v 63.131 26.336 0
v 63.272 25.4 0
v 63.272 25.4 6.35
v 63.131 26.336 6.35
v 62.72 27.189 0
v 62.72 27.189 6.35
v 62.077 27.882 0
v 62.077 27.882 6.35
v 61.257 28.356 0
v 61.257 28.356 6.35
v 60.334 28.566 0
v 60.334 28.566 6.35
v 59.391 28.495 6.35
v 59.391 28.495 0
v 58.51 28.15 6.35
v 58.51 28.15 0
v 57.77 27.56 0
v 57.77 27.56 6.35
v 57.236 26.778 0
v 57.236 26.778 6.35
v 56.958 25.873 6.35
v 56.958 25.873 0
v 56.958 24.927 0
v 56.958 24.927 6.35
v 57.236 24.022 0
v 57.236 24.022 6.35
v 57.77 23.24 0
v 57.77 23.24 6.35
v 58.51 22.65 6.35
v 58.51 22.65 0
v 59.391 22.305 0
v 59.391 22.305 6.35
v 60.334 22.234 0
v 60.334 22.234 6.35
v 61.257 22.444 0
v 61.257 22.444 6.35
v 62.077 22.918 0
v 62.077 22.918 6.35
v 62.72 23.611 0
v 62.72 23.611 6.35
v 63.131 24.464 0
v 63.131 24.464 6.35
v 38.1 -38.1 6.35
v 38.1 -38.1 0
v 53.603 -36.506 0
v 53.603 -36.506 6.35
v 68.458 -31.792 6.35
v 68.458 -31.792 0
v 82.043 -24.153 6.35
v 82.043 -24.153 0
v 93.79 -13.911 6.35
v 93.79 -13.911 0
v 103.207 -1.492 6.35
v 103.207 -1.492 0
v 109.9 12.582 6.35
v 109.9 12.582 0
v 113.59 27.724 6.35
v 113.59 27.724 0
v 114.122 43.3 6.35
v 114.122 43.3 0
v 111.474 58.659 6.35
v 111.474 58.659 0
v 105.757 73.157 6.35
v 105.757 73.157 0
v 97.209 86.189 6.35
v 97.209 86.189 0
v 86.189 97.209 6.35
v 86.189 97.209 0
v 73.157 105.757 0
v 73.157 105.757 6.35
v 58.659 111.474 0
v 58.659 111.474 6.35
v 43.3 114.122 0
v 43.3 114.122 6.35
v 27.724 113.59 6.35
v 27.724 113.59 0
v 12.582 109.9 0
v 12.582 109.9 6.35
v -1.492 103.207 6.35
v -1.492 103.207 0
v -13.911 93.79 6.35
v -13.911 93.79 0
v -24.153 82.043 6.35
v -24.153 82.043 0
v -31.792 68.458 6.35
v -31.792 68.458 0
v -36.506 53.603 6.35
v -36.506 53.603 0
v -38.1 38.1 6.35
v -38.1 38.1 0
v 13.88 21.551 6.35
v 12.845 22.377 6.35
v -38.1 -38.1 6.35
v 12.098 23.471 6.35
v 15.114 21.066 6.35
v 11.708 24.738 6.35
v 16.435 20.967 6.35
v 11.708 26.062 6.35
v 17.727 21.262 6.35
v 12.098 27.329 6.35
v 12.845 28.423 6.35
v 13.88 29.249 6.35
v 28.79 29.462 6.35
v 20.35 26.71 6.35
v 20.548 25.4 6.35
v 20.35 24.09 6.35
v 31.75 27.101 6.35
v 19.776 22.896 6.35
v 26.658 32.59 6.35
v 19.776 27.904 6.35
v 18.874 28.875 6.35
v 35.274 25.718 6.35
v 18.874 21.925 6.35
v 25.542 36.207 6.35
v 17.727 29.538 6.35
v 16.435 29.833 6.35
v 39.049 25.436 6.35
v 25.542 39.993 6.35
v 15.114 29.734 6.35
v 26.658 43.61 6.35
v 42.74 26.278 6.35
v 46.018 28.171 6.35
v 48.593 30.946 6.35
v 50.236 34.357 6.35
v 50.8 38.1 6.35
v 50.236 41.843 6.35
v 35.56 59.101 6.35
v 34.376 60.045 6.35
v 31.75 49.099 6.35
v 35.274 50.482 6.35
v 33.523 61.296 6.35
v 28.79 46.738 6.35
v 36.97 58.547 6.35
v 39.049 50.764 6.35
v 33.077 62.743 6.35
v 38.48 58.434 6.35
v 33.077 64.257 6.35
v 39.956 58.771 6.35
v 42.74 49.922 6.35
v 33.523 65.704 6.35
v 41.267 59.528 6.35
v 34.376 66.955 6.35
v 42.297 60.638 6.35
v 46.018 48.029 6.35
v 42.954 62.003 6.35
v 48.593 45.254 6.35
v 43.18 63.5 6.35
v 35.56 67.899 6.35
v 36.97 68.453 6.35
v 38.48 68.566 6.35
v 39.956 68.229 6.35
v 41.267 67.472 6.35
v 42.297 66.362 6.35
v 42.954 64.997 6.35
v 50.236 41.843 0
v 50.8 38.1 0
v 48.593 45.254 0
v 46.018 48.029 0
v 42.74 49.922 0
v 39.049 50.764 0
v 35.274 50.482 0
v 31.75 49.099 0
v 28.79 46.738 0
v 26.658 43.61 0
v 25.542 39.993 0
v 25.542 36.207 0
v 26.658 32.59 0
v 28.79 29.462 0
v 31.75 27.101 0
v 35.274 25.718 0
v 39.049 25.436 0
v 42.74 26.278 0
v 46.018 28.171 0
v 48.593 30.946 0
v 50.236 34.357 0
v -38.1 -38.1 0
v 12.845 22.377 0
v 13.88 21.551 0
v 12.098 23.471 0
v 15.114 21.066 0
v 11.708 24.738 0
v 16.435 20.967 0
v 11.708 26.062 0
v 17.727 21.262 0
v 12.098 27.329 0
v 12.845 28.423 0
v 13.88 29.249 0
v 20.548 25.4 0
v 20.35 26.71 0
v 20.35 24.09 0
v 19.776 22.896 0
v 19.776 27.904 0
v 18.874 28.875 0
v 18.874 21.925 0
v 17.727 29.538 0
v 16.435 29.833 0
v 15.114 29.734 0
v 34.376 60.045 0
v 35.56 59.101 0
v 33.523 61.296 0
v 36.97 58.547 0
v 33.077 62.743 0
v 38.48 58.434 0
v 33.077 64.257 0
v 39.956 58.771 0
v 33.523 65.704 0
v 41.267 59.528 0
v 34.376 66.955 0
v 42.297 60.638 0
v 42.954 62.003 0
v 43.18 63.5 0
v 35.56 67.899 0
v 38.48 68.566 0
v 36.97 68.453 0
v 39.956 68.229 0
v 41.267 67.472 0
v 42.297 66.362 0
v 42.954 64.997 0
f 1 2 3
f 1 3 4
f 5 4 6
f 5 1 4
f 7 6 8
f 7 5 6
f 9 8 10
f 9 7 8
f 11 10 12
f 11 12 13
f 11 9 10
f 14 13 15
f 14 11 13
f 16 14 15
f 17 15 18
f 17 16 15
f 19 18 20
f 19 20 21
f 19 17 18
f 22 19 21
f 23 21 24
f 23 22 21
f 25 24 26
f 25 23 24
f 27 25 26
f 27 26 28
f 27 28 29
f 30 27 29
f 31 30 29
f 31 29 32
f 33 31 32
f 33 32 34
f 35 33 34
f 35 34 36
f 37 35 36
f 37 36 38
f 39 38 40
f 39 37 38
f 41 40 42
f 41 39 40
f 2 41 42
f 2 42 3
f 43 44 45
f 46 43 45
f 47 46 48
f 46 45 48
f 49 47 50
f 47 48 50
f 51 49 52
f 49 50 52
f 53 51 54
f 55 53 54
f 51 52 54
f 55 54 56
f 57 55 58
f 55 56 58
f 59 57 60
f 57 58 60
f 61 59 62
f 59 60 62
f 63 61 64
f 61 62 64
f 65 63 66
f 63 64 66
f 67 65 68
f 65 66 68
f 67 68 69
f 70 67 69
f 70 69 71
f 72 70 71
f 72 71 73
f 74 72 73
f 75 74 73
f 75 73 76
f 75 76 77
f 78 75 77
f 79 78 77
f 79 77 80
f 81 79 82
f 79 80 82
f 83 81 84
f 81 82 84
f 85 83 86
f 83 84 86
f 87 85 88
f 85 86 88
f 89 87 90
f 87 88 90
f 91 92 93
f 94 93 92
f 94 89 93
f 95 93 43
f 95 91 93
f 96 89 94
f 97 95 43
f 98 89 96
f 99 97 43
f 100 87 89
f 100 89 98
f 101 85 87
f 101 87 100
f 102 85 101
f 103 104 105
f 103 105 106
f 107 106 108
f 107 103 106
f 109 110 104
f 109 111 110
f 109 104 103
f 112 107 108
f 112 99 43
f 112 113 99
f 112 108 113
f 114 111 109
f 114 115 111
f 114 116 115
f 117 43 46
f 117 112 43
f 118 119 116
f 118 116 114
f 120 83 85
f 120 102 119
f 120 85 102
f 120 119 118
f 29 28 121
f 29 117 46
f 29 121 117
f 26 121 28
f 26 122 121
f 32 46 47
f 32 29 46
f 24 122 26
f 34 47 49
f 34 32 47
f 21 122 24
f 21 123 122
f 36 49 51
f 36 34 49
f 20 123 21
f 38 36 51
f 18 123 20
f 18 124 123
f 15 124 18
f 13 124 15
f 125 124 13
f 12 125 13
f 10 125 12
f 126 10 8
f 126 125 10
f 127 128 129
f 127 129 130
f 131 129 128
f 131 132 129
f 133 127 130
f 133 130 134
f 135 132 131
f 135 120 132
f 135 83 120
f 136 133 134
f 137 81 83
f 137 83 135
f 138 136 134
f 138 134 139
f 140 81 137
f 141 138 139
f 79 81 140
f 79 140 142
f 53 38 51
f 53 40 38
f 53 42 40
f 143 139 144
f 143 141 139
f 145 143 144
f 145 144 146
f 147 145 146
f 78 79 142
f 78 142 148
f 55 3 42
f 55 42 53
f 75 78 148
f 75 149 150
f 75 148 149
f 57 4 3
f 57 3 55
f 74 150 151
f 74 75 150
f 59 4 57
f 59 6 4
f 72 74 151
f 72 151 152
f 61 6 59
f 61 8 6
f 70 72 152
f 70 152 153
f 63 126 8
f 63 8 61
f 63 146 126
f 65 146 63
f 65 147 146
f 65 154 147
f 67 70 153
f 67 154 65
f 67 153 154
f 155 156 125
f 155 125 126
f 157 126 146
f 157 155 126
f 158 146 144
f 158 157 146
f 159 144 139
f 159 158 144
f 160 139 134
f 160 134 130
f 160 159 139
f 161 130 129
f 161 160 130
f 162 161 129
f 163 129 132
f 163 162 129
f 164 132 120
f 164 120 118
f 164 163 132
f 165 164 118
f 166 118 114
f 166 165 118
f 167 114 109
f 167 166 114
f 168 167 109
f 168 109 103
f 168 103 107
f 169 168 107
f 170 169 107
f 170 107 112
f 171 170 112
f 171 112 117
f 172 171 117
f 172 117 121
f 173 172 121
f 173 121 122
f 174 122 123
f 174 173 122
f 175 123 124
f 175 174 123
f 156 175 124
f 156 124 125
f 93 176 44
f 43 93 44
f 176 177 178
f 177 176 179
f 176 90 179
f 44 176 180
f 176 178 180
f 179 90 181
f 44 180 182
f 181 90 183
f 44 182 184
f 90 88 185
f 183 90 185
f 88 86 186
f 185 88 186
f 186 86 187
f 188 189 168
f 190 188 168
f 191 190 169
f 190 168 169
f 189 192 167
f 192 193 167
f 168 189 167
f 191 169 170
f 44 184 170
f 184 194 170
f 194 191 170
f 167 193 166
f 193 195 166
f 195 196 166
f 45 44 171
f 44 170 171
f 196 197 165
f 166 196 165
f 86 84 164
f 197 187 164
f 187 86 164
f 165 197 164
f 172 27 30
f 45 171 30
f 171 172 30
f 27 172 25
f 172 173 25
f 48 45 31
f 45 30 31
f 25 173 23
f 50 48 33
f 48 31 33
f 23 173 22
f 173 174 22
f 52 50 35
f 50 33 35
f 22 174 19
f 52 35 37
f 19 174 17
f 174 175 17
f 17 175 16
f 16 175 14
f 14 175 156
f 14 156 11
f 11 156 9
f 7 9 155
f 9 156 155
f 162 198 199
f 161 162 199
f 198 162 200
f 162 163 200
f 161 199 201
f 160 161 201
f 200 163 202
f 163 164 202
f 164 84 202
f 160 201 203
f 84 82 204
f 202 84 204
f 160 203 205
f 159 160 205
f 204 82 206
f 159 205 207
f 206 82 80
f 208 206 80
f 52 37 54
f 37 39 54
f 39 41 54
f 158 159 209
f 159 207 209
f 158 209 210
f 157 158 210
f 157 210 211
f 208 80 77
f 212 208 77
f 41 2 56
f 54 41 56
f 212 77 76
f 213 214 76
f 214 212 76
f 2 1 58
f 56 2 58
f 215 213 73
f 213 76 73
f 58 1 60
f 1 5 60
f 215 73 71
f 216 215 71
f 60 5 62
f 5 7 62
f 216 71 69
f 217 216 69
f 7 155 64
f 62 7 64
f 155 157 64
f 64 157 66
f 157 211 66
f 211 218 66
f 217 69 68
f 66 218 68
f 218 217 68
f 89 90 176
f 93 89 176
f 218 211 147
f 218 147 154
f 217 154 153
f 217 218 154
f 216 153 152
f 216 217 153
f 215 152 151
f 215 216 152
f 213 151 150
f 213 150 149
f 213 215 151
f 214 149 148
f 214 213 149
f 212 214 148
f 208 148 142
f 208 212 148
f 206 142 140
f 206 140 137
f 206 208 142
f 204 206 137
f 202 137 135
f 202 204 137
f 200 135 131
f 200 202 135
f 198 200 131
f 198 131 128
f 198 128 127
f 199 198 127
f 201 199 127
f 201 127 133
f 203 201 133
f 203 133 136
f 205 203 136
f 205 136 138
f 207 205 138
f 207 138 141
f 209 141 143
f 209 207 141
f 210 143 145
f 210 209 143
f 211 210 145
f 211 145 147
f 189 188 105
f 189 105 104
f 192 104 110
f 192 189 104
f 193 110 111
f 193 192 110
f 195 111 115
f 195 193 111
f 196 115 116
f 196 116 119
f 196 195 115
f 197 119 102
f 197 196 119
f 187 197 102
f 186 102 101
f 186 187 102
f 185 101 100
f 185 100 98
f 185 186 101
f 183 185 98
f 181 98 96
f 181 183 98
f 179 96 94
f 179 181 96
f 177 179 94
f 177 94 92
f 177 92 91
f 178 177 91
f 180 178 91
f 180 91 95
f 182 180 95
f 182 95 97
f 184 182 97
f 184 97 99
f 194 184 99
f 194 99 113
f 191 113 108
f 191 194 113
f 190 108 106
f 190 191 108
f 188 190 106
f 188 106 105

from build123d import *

# Parameters (mm, degrees)
F0_R     = 4.445
F0_R_2   = 3.175
F0_R_3   = 12.7
F0_R_4   = 5.08
F1_DEPTH = 6.35


with BuildPart() as f1:
    # F0 (on Top) → F1 (new body)
    with BuildSketch(Plane.XY):
        with BuildLine():
            Line((-38.1, -38.1), (38.1, -38.1))
            ThreePointArc((38.1, -38.1), (91.981537, 91.981537), (-38.1, 38.1))
            Line((-38.1, 38.1), (-38.1, -38.1))
        make_face()
        with Locations((16.102955, 25.4)):
            Circle(F0_R, mode=Mode.SUBTRACT)
        with Locations((60.097045, 25.4)):
            Circle(F0_R_2, mode=Mode.SUBTRACT)
        with Locations((38.1, 38.1)):
            Circle(F0_R_3, mode=Mode.SUBTRACT)
        with Locations((38.1, 63.5)):
            Circle(F0_R_4, mode=Mode.SUBTRACT)
    extrude(amount=F1_DEPTH)


solid = f1.part
